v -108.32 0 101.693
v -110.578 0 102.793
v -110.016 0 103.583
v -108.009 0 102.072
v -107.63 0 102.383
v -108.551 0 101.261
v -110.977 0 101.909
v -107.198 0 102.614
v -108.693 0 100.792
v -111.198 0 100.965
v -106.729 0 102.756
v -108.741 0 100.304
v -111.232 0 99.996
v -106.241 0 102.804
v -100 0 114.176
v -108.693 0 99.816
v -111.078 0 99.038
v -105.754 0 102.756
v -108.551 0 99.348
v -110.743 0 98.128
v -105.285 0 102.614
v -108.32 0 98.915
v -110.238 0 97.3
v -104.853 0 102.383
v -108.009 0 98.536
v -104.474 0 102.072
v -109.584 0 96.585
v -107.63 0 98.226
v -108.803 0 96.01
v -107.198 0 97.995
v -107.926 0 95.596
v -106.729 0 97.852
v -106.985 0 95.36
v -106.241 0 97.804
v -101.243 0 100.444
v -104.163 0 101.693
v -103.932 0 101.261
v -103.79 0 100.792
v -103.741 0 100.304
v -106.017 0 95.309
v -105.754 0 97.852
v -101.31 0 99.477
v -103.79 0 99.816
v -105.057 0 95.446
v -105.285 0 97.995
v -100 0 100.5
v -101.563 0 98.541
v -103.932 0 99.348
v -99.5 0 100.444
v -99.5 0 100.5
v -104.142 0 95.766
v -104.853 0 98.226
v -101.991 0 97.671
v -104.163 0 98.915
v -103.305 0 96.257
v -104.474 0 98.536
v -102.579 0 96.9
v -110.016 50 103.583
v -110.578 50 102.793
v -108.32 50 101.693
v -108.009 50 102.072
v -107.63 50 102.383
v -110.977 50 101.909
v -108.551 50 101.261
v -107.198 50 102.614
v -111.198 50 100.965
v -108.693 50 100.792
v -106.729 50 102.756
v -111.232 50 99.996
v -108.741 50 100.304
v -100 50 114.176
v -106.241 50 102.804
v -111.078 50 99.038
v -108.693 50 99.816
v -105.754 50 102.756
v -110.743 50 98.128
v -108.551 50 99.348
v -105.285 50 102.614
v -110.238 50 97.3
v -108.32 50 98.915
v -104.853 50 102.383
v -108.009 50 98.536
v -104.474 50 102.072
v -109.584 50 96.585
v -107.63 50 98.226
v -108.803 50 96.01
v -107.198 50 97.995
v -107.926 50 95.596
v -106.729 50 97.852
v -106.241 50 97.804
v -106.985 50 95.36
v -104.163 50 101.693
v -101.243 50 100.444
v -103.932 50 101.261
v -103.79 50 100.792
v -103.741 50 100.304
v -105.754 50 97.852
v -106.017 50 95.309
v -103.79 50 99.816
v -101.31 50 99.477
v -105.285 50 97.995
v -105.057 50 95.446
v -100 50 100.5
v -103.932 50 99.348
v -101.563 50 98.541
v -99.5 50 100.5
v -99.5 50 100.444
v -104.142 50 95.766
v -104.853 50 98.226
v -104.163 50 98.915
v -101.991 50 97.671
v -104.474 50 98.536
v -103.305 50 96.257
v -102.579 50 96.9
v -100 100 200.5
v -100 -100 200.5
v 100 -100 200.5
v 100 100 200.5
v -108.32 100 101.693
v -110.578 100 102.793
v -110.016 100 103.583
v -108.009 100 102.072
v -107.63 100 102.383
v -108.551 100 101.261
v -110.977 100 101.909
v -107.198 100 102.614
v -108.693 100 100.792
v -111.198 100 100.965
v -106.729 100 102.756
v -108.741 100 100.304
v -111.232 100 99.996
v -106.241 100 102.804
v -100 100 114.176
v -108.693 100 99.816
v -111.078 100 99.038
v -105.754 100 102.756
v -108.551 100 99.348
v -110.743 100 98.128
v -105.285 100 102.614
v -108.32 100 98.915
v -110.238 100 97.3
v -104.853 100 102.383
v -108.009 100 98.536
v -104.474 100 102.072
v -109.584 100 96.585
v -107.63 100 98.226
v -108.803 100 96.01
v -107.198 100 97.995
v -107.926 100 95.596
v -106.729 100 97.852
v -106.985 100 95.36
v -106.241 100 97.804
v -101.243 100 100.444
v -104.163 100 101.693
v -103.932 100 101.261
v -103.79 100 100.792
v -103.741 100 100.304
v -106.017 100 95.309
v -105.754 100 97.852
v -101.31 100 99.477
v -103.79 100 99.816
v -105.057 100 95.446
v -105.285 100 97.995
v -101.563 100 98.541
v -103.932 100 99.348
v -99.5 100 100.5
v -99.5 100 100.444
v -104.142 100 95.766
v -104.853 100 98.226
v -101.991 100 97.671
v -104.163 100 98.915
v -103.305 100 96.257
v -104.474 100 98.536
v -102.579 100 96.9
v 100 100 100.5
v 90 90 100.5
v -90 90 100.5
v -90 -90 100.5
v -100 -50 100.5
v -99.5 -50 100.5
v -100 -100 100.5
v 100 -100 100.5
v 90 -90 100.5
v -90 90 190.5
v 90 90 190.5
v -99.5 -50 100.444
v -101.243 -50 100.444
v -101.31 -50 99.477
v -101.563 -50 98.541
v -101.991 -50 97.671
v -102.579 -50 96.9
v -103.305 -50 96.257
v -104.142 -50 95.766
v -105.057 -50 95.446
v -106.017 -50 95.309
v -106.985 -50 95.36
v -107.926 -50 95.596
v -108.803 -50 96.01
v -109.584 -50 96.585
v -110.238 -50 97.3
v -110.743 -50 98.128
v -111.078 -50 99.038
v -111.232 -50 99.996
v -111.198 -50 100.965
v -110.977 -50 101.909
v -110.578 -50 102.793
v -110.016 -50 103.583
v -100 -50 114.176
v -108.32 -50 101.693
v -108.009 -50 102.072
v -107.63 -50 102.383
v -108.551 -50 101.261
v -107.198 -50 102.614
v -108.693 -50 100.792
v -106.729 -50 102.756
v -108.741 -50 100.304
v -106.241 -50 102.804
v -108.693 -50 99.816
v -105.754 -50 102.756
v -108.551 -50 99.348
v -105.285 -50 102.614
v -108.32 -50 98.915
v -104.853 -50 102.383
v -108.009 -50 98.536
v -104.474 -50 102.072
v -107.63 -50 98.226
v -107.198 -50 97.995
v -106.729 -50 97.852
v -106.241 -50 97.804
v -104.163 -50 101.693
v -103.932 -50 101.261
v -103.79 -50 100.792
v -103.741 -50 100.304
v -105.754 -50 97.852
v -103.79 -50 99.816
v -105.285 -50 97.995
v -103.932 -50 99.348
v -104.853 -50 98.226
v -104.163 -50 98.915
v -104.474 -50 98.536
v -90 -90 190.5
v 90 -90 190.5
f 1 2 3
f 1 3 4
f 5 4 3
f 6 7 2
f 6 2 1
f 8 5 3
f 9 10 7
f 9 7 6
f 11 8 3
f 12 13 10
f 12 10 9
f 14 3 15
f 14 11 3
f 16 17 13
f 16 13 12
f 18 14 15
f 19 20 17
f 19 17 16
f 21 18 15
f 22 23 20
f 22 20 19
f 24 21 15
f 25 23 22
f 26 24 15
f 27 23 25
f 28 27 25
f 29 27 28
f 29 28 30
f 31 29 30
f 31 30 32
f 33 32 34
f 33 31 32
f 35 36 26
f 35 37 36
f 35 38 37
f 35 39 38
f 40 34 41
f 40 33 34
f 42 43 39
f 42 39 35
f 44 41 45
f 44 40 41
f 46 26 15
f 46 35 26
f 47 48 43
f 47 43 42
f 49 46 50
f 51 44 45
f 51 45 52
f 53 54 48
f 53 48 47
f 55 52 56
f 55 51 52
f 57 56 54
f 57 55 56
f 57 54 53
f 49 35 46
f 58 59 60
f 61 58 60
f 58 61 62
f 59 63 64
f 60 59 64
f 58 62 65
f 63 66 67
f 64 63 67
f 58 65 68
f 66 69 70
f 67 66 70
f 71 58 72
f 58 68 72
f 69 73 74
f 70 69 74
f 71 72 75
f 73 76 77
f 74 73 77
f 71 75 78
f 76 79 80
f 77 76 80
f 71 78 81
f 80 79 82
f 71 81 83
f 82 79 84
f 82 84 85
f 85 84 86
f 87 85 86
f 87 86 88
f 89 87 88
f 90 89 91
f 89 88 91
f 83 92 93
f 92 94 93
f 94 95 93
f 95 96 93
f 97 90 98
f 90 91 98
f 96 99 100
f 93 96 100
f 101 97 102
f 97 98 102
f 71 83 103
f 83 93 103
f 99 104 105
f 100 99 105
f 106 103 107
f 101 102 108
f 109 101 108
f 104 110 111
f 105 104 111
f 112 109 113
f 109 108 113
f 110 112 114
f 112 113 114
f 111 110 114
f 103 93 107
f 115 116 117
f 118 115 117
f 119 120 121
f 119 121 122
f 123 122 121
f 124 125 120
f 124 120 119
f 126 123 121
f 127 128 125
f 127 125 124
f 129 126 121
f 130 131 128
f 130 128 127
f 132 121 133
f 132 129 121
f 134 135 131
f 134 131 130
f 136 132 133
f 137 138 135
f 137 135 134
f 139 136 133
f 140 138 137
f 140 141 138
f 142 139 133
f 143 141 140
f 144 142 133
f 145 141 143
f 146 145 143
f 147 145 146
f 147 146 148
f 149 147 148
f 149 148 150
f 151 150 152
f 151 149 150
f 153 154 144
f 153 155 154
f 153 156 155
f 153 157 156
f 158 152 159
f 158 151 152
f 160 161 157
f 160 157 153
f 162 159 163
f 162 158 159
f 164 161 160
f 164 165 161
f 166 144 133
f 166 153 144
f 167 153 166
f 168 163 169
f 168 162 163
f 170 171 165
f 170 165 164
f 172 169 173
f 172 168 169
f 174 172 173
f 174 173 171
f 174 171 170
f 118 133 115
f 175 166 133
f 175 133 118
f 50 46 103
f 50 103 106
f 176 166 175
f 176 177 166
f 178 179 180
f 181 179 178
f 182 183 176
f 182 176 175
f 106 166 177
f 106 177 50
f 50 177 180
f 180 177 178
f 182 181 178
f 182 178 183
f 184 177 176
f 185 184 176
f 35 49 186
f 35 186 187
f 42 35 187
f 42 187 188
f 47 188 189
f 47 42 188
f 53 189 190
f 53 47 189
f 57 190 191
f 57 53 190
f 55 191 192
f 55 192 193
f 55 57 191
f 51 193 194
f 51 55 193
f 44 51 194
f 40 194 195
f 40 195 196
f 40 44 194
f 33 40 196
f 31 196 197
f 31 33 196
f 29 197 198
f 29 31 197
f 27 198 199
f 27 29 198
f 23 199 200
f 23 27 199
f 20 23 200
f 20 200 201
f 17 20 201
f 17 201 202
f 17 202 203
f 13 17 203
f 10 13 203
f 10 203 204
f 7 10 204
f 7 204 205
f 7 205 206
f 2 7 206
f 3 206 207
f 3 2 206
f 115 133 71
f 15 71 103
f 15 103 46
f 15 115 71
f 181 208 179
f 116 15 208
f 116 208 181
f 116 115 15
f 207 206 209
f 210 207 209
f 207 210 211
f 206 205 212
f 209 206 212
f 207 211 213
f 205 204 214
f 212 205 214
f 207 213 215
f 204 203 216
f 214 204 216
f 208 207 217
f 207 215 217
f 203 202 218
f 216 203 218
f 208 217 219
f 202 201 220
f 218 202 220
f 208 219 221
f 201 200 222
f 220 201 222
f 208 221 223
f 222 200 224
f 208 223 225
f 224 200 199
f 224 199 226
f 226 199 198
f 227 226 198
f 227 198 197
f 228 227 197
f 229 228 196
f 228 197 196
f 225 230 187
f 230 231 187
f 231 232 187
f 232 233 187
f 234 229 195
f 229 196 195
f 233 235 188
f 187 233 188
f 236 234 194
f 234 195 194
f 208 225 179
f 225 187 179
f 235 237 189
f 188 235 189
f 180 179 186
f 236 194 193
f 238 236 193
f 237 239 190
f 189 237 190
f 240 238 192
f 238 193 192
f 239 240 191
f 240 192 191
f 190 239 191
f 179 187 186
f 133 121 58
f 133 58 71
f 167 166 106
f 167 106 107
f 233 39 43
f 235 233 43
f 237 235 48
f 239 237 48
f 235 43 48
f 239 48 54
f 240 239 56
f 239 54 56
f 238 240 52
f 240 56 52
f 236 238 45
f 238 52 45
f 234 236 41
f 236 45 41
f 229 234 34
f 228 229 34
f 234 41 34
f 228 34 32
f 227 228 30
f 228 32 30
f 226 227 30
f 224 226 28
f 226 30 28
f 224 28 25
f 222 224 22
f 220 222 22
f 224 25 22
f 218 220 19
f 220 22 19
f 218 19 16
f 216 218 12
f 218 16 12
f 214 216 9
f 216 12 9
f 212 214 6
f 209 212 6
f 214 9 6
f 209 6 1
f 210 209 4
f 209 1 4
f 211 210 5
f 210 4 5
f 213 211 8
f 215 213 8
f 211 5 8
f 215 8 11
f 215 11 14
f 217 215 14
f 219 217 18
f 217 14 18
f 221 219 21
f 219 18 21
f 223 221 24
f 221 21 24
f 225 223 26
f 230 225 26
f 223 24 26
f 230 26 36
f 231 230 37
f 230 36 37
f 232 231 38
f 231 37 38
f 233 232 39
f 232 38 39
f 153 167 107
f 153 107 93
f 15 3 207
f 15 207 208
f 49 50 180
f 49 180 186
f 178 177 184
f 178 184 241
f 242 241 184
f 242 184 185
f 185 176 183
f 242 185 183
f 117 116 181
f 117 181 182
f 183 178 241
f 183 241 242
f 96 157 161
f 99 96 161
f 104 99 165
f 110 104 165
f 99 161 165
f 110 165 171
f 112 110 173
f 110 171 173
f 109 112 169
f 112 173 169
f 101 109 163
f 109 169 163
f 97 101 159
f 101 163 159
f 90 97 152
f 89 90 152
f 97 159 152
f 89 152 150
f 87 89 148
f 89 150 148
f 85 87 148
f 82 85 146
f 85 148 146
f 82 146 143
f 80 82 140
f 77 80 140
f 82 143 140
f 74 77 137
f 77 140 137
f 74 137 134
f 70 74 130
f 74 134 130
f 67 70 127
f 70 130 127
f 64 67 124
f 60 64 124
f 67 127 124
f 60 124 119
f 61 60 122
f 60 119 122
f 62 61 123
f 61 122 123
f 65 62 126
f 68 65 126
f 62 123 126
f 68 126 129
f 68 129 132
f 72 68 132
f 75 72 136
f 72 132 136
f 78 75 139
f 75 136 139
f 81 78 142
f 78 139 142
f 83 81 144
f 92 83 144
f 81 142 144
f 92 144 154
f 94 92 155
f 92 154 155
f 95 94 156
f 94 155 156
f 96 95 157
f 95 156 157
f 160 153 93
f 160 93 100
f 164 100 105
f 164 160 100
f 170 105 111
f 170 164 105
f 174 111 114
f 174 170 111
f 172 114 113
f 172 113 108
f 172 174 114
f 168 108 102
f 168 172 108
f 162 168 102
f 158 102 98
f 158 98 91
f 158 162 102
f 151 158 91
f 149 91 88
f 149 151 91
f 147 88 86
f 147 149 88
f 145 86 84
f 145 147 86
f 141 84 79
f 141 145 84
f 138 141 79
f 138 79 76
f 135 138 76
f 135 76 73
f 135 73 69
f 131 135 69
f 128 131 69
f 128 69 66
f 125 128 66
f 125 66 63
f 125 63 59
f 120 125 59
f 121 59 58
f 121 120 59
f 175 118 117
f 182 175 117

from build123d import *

# Parameters (mm, degrees)
SKETCH003_W             = 200
SKETCH003_H             = 200
PAD002_DEPTH            = 100
SKETCH004_W             = 180
SKETCH004_H             = 180
POCKET001_DEPTH         = 90
SKETCH005_R             = 2.5
PAD003_DEPTH            = 50
LINEARPATTERN001_COUNT  = 2
LINEARPATTERN001_PITCH  = 100
BODY003_PLACEMENT_ANGLE = 180


with BuildPart() as part:
    # Sketch003 → Pad002 (new body)
    with BuildSketch(Plane.XY):
        Rectangle(SKETCH003_W, SKETCH003_H)
    extrude(amount=PAD002_DEPTH)

    # Sketch004 (on Face6 of Pad002) → Pocket001 (cut)
    with BuildSketch(Plane.XY.offset(100)):
        Rectangle(SKETCH004_W, SKETCH004_H)
    extrude(amount=-POCKET001_DEPTH, mode=Mode.SUBTRACT)

    # Sketch005 (on Face6 of Pocket001) → Pad003 (join)
    with BuildSketch(Plane.XZ.offset(100)):
        with BuildLine():
            ThreePointArc((-101.243422, 100.055887), (-107.925827, 104.903535), (-110.016374, 96.917056))
            Line((-110.016374, 96.917056), (-99.591536, 85.891823))
            Line((-99.591536, 85.891823), (-99.5, 100.055887))
            Line((-99.5, 100.055887), (-101.243422, 100.055887))
        make_face()
        with Locations((-106.241464, 100.195784)):
            Circle(SKETCH005_R, mode=Mode.SUBTRACT)
    pad003 = extrude(amount=-PAD003_DEPTH)

    # LinearPattern001: Pad003 ×2
    with Locations(*[(0, i * LINEARPATTERN001_PITCH, 0) for i in range(1, LINEARPATTERN001_COUNT)]):
        add(pad003)


with BuildPart() as part_1:
    # Body003 placement: moved
    add(part.part.moved(Location((0, 0, 200.5))).rotate(Axis((0, 0, 200.5), (1, 0, 0)), BODY003_PLACEMENT_ANGLE))


solid = part_1.part
